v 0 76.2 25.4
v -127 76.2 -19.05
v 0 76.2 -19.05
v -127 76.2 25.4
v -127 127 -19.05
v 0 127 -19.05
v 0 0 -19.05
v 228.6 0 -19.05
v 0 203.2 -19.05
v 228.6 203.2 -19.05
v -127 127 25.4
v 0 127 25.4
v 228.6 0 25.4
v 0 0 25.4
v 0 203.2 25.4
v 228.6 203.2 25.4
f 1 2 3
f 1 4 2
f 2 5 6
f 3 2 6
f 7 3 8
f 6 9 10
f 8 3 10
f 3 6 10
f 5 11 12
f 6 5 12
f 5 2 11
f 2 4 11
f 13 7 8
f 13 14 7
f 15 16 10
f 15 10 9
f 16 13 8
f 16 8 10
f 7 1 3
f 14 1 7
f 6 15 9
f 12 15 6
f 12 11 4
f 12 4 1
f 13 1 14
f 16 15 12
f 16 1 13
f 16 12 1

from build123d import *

# Parameters (mm, degrees)
F0_W          = 127
F0_H          = 50.8
F1_DEPTH      = 25.4
F1_DEPTH_BACK = 19.05


with BuildPart() as f1:
    # F0 (on Top) → F1 (new body, two sides)
    with BuildSketch(Plane.XY) as f1_sk:
        Polygon((0, 76.2), (0, 0), (228.6, 0), (228.6, 203.2), (0, 203.2), (0, 127), align=None)
        with Locations((-63.5, 101.6)):
            Rectangle(F0_W, F0_H)
    extrude(amount=F1_DEPTH)
    extrude(f1_sk.sketch, amount=-F1_DEPTH_BACK)


solid = f1.part
